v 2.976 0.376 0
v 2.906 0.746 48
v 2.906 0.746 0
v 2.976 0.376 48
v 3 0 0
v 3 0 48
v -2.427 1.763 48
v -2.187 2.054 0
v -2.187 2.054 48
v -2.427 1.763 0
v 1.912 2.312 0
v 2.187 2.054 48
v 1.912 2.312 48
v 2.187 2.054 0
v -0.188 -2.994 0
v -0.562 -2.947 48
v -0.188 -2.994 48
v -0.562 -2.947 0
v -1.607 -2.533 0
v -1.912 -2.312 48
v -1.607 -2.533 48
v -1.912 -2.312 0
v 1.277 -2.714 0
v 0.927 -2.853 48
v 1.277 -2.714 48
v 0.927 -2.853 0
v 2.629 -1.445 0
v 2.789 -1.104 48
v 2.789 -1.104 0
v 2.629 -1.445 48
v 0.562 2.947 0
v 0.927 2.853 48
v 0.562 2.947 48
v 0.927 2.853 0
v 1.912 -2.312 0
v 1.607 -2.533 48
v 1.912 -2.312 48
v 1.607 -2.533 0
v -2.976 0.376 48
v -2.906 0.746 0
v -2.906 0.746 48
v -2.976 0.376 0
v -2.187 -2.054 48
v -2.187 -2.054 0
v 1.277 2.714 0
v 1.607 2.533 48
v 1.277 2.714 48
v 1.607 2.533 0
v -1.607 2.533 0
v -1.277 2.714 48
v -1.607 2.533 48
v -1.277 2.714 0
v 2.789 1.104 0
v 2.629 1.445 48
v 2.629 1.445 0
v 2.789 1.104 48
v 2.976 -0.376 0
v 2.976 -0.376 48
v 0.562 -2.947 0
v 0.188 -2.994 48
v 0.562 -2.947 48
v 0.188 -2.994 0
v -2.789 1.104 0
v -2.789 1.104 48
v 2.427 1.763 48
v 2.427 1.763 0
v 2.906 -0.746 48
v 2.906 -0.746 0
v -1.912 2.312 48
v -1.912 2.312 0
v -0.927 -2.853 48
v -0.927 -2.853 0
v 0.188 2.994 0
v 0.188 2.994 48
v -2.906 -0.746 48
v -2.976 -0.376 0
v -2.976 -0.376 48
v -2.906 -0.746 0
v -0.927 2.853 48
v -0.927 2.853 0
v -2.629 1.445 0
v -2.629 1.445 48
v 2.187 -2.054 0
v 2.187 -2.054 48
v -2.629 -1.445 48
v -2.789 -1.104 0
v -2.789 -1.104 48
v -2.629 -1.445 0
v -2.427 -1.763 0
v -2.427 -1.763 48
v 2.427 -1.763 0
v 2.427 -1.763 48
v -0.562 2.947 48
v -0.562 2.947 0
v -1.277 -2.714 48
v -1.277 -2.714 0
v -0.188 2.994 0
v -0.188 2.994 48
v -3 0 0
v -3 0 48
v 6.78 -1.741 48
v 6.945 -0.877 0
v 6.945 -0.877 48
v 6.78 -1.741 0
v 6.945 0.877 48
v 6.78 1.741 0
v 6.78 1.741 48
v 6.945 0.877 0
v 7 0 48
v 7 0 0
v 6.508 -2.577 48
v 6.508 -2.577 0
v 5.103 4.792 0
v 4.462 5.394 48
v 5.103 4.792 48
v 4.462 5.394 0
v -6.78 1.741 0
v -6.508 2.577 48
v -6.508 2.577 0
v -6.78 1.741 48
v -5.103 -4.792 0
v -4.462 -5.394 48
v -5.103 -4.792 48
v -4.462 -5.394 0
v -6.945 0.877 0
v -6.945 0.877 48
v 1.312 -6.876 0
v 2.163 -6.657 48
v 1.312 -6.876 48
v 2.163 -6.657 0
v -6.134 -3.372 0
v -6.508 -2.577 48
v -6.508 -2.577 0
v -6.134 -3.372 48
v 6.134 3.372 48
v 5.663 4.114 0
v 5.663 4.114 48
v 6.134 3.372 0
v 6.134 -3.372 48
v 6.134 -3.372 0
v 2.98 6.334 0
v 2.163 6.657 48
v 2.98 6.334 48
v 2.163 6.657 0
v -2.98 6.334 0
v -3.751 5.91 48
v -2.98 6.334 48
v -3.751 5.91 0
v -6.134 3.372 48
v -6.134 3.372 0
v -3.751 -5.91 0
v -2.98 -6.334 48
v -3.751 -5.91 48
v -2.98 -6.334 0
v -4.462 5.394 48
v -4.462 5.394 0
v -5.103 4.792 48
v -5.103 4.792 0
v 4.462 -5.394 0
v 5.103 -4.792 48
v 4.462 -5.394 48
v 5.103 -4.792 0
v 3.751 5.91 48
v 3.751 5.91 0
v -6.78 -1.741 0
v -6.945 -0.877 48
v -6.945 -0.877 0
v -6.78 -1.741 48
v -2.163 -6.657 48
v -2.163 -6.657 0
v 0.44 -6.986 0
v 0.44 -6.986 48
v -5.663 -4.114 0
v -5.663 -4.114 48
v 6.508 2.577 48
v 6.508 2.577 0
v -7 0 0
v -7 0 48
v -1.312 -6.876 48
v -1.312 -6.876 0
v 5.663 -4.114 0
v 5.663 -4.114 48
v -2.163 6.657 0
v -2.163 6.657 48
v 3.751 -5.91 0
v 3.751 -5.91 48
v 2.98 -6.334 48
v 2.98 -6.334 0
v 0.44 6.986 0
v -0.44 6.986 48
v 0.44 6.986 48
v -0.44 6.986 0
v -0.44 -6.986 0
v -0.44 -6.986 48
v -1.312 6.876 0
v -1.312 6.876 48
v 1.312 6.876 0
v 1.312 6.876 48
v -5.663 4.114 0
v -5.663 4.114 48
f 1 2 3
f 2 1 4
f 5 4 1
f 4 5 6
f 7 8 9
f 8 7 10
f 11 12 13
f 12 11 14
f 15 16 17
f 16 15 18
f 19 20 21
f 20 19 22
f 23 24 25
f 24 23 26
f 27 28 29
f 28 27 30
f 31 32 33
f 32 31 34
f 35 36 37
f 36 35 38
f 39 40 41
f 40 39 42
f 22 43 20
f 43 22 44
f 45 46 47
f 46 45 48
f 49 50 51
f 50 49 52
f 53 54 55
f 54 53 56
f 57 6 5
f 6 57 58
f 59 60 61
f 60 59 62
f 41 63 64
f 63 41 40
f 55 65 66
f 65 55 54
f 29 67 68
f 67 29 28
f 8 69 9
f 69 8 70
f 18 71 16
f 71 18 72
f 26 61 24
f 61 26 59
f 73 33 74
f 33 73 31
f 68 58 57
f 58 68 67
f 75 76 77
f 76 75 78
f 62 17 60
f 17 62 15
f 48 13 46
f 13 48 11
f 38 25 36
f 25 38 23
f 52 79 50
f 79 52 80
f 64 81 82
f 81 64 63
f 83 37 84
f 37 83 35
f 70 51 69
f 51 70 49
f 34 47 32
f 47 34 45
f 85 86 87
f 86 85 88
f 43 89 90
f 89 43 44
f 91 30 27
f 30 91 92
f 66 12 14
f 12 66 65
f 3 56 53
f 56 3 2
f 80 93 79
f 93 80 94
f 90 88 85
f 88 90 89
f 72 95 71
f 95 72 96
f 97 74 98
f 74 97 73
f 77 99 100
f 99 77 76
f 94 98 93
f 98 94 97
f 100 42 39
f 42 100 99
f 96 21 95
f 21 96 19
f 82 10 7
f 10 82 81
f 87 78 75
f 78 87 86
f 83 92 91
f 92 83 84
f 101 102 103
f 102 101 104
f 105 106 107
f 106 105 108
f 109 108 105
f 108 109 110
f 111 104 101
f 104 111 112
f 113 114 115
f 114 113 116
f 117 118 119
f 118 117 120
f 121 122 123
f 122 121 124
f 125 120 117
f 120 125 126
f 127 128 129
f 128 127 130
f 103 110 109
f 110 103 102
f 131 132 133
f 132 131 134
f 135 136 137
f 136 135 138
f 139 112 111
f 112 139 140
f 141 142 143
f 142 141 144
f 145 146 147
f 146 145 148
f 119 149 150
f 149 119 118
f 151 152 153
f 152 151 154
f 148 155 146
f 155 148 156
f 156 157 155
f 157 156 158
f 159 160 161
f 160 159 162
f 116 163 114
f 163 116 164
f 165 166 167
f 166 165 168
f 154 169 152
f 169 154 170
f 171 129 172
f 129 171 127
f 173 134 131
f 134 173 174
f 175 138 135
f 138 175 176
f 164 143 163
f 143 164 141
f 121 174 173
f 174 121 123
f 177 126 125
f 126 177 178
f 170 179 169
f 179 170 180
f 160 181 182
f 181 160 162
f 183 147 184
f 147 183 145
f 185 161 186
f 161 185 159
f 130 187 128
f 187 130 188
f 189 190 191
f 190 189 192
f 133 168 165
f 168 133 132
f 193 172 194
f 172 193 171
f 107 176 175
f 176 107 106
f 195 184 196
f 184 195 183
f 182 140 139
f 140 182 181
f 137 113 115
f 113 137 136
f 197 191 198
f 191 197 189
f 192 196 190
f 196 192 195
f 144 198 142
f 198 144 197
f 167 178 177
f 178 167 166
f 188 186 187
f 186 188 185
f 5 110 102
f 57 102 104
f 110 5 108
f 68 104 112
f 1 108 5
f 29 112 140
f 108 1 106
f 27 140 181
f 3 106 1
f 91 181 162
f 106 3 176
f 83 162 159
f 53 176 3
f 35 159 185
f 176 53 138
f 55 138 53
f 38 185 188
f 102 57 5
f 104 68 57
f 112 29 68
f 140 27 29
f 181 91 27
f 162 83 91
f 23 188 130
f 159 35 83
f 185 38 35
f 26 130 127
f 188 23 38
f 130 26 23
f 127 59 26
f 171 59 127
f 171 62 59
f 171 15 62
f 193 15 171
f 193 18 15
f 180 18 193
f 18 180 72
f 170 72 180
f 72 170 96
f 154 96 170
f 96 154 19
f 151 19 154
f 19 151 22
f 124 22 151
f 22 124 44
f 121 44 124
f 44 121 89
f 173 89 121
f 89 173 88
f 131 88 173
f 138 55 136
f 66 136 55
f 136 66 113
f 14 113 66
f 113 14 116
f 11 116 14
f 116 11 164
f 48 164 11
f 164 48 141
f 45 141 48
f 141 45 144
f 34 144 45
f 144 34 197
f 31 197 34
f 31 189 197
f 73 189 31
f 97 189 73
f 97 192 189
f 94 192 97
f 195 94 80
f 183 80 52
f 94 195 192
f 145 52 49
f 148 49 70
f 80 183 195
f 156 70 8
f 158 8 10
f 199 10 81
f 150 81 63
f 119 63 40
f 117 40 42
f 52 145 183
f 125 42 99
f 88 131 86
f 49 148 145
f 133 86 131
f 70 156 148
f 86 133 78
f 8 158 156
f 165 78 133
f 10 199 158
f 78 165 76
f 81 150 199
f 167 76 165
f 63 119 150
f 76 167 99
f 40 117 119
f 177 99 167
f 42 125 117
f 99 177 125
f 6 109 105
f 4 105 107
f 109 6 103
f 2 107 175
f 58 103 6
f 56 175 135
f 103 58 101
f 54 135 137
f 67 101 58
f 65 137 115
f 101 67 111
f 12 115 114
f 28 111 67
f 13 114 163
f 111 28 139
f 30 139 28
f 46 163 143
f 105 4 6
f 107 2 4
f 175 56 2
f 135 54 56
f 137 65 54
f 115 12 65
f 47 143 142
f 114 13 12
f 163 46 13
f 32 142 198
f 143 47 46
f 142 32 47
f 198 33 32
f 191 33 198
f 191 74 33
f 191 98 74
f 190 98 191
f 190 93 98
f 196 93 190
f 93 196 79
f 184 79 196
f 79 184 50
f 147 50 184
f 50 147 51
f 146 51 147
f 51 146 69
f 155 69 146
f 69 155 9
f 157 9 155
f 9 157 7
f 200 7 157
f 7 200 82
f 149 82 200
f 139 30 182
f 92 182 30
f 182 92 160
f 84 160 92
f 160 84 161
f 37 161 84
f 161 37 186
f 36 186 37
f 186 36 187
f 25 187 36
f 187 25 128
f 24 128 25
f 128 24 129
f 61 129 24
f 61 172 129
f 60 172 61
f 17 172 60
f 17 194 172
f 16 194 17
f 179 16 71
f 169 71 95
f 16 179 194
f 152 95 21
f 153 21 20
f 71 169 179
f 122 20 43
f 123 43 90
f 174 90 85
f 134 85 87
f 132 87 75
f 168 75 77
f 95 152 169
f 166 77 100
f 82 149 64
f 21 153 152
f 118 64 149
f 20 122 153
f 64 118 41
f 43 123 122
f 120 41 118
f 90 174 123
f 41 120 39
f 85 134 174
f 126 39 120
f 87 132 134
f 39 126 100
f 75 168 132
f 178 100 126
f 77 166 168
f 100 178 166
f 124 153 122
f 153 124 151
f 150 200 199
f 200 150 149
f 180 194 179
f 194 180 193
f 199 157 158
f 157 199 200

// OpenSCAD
$fn = 50;


difference() {
	union() {
		cylinder(h = 48, r = 7.0000000000);
	}
	union() {
		translate(v = [0.0000000000, 0.0000000000, -100.0000000000]) {
			cylinder(h = 200, r = 3.0000000000);
		}
		cylinder(h = 48, r = 1.5000000000);
		cylinder(h = 48, r = 1.5000000000);
		cylinder(h = 48, r = 1.5000000000);
	}
}
